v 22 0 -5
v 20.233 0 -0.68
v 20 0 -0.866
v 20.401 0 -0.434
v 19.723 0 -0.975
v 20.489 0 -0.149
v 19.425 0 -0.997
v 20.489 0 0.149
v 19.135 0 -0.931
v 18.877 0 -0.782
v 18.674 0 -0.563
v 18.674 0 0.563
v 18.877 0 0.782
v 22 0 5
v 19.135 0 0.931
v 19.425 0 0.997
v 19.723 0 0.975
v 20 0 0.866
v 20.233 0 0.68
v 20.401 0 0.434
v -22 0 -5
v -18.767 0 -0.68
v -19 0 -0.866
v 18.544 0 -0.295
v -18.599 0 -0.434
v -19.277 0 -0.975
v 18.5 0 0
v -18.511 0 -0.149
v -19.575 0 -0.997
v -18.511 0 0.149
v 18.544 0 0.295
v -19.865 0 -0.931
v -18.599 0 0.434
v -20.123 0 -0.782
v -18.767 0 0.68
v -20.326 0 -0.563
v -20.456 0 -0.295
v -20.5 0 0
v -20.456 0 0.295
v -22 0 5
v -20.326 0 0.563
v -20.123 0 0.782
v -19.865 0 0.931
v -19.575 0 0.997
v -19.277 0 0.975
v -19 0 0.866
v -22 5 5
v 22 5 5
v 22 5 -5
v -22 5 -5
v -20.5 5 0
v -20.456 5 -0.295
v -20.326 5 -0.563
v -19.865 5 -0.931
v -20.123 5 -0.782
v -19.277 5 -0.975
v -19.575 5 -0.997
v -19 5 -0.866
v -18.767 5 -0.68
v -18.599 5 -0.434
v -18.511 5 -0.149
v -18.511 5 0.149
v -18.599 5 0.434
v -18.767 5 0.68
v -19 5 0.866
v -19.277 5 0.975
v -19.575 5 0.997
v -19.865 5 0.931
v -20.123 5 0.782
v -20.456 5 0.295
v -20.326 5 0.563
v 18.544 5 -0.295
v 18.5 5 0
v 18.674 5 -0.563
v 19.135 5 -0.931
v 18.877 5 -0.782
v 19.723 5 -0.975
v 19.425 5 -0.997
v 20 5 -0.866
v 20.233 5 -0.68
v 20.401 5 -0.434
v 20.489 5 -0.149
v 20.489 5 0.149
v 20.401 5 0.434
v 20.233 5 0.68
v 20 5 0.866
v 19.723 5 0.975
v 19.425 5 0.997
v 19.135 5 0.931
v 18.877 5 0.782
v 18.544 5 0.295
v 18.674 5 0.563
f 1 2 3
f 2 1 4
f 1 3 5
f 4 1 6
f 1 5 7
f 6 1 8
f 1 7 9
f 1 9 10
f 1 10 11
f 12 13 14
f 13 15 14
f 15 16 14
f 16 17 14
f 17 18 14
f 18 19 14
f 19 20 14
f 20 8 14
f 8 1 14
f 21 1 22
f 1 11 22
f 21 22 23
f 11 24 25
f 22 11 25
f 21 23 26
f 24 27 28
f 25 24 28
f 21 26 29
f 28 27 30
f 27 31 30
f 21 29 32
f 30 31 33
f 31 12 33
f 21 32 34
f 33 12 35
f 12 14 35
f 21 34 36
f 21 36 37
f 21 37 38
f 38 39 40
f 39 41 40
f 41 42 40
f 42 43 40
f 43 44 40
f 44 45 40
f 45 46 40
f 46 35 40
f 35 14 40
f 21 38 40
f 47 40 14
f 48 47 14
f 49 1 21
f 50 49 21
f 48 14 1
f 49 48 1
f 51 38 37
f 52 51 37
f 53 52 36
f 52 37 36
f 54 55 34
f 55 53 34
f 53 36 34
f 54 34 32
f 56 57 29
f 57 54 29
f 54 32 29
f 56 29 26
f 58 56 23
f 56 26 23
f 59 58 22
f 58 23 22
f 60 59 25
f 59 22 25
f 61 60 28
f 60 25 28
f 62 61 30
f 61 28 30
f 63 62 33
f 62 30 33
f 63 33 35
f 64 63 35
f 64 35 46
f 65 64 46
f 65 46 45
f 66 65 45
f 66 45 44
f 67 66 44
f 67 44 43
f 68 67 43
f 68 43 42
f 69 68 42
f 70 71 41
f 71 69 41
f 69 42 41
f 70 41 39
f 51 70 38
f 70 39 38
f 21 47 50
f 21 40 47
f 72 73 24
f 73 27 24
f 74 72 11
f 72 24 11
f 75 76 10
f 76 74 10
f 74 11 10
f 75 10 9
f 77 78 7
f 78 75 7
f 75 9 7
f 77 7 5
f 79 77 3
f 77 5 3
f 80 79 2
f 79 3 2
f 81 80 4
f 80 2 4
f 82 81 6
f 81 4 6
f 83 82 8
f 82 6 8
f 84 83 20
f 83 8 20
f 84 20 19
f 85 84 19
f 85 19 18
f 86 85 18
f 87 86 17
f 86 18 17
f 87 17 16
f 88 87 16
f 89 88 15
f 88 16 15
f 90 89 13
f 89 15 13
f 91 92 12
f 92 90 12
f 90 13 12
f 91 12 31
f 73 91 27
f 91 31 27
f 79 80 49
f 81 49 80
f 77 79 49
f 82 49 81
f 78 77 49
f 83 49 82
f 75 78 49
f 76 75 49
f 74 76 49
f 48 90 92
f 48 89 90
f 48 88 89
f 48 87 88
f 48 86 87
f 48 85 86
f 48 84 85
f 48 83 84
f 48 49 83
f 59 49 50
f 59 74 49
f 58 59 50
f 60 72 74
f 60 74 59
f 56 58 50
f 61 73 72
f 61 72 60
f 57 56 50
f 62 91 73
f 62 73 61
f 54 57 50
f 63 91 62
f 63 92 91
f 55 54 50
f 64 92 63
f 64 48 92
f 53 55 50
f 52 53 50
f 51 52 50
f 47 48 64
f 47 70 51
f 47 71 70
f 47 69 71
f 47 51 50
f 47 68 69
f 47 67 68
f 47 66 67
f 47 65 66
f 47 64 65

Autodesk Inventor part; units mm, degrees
ref_plane "YZ Plane" through (0, 0, 0) normal (1, 0, 0) x (0, 1, 0)
ref_plane "XZ Plane" through (0, 0, 0) normal (0, 1, 0) x (-1, 0, 0)
ref_plane "XY Plane" through (0, 0, 0) normal (0, 0, 1) x (1, 0, 0)
sketch "Sketch1" plane through (0, 0, 0) normal (0, 1, 0) x (-1, 0, 0)
  line L0 (-22, -5) -> (22, -5)
  line L1 (22, 0) -> (22, 0)
  line L2 (22, 5) -> (-22, 5)
  line L3 (-22, 0) -> (-22, 0)
  line L4 (-22, -5) -> (22, 5) construction
  line L5 (22, -5) -> (-22, 5) construction
  circle A0 centre (19.5, 0) radius 1
  line L6 (-22, 5) -> (-22, -5)
  line L7 (22, 5) -> (22, -5)
  circle A1 centre (-19.5, 0) radius 1
  point P0 (0, 0)
  dimension "d0" = 10
  dimension "d1" = 44
  dimension "d3" = 2
  dimension "d6" = 2.5
  dimension "d8" = 5
  dimension "d13" = 2
  dimension "d14" = 2.5
  dimension "d15" = 5
extrude "Extrusion1" add sketch "Sketch1" along normal blind 5
properties part number "link"
